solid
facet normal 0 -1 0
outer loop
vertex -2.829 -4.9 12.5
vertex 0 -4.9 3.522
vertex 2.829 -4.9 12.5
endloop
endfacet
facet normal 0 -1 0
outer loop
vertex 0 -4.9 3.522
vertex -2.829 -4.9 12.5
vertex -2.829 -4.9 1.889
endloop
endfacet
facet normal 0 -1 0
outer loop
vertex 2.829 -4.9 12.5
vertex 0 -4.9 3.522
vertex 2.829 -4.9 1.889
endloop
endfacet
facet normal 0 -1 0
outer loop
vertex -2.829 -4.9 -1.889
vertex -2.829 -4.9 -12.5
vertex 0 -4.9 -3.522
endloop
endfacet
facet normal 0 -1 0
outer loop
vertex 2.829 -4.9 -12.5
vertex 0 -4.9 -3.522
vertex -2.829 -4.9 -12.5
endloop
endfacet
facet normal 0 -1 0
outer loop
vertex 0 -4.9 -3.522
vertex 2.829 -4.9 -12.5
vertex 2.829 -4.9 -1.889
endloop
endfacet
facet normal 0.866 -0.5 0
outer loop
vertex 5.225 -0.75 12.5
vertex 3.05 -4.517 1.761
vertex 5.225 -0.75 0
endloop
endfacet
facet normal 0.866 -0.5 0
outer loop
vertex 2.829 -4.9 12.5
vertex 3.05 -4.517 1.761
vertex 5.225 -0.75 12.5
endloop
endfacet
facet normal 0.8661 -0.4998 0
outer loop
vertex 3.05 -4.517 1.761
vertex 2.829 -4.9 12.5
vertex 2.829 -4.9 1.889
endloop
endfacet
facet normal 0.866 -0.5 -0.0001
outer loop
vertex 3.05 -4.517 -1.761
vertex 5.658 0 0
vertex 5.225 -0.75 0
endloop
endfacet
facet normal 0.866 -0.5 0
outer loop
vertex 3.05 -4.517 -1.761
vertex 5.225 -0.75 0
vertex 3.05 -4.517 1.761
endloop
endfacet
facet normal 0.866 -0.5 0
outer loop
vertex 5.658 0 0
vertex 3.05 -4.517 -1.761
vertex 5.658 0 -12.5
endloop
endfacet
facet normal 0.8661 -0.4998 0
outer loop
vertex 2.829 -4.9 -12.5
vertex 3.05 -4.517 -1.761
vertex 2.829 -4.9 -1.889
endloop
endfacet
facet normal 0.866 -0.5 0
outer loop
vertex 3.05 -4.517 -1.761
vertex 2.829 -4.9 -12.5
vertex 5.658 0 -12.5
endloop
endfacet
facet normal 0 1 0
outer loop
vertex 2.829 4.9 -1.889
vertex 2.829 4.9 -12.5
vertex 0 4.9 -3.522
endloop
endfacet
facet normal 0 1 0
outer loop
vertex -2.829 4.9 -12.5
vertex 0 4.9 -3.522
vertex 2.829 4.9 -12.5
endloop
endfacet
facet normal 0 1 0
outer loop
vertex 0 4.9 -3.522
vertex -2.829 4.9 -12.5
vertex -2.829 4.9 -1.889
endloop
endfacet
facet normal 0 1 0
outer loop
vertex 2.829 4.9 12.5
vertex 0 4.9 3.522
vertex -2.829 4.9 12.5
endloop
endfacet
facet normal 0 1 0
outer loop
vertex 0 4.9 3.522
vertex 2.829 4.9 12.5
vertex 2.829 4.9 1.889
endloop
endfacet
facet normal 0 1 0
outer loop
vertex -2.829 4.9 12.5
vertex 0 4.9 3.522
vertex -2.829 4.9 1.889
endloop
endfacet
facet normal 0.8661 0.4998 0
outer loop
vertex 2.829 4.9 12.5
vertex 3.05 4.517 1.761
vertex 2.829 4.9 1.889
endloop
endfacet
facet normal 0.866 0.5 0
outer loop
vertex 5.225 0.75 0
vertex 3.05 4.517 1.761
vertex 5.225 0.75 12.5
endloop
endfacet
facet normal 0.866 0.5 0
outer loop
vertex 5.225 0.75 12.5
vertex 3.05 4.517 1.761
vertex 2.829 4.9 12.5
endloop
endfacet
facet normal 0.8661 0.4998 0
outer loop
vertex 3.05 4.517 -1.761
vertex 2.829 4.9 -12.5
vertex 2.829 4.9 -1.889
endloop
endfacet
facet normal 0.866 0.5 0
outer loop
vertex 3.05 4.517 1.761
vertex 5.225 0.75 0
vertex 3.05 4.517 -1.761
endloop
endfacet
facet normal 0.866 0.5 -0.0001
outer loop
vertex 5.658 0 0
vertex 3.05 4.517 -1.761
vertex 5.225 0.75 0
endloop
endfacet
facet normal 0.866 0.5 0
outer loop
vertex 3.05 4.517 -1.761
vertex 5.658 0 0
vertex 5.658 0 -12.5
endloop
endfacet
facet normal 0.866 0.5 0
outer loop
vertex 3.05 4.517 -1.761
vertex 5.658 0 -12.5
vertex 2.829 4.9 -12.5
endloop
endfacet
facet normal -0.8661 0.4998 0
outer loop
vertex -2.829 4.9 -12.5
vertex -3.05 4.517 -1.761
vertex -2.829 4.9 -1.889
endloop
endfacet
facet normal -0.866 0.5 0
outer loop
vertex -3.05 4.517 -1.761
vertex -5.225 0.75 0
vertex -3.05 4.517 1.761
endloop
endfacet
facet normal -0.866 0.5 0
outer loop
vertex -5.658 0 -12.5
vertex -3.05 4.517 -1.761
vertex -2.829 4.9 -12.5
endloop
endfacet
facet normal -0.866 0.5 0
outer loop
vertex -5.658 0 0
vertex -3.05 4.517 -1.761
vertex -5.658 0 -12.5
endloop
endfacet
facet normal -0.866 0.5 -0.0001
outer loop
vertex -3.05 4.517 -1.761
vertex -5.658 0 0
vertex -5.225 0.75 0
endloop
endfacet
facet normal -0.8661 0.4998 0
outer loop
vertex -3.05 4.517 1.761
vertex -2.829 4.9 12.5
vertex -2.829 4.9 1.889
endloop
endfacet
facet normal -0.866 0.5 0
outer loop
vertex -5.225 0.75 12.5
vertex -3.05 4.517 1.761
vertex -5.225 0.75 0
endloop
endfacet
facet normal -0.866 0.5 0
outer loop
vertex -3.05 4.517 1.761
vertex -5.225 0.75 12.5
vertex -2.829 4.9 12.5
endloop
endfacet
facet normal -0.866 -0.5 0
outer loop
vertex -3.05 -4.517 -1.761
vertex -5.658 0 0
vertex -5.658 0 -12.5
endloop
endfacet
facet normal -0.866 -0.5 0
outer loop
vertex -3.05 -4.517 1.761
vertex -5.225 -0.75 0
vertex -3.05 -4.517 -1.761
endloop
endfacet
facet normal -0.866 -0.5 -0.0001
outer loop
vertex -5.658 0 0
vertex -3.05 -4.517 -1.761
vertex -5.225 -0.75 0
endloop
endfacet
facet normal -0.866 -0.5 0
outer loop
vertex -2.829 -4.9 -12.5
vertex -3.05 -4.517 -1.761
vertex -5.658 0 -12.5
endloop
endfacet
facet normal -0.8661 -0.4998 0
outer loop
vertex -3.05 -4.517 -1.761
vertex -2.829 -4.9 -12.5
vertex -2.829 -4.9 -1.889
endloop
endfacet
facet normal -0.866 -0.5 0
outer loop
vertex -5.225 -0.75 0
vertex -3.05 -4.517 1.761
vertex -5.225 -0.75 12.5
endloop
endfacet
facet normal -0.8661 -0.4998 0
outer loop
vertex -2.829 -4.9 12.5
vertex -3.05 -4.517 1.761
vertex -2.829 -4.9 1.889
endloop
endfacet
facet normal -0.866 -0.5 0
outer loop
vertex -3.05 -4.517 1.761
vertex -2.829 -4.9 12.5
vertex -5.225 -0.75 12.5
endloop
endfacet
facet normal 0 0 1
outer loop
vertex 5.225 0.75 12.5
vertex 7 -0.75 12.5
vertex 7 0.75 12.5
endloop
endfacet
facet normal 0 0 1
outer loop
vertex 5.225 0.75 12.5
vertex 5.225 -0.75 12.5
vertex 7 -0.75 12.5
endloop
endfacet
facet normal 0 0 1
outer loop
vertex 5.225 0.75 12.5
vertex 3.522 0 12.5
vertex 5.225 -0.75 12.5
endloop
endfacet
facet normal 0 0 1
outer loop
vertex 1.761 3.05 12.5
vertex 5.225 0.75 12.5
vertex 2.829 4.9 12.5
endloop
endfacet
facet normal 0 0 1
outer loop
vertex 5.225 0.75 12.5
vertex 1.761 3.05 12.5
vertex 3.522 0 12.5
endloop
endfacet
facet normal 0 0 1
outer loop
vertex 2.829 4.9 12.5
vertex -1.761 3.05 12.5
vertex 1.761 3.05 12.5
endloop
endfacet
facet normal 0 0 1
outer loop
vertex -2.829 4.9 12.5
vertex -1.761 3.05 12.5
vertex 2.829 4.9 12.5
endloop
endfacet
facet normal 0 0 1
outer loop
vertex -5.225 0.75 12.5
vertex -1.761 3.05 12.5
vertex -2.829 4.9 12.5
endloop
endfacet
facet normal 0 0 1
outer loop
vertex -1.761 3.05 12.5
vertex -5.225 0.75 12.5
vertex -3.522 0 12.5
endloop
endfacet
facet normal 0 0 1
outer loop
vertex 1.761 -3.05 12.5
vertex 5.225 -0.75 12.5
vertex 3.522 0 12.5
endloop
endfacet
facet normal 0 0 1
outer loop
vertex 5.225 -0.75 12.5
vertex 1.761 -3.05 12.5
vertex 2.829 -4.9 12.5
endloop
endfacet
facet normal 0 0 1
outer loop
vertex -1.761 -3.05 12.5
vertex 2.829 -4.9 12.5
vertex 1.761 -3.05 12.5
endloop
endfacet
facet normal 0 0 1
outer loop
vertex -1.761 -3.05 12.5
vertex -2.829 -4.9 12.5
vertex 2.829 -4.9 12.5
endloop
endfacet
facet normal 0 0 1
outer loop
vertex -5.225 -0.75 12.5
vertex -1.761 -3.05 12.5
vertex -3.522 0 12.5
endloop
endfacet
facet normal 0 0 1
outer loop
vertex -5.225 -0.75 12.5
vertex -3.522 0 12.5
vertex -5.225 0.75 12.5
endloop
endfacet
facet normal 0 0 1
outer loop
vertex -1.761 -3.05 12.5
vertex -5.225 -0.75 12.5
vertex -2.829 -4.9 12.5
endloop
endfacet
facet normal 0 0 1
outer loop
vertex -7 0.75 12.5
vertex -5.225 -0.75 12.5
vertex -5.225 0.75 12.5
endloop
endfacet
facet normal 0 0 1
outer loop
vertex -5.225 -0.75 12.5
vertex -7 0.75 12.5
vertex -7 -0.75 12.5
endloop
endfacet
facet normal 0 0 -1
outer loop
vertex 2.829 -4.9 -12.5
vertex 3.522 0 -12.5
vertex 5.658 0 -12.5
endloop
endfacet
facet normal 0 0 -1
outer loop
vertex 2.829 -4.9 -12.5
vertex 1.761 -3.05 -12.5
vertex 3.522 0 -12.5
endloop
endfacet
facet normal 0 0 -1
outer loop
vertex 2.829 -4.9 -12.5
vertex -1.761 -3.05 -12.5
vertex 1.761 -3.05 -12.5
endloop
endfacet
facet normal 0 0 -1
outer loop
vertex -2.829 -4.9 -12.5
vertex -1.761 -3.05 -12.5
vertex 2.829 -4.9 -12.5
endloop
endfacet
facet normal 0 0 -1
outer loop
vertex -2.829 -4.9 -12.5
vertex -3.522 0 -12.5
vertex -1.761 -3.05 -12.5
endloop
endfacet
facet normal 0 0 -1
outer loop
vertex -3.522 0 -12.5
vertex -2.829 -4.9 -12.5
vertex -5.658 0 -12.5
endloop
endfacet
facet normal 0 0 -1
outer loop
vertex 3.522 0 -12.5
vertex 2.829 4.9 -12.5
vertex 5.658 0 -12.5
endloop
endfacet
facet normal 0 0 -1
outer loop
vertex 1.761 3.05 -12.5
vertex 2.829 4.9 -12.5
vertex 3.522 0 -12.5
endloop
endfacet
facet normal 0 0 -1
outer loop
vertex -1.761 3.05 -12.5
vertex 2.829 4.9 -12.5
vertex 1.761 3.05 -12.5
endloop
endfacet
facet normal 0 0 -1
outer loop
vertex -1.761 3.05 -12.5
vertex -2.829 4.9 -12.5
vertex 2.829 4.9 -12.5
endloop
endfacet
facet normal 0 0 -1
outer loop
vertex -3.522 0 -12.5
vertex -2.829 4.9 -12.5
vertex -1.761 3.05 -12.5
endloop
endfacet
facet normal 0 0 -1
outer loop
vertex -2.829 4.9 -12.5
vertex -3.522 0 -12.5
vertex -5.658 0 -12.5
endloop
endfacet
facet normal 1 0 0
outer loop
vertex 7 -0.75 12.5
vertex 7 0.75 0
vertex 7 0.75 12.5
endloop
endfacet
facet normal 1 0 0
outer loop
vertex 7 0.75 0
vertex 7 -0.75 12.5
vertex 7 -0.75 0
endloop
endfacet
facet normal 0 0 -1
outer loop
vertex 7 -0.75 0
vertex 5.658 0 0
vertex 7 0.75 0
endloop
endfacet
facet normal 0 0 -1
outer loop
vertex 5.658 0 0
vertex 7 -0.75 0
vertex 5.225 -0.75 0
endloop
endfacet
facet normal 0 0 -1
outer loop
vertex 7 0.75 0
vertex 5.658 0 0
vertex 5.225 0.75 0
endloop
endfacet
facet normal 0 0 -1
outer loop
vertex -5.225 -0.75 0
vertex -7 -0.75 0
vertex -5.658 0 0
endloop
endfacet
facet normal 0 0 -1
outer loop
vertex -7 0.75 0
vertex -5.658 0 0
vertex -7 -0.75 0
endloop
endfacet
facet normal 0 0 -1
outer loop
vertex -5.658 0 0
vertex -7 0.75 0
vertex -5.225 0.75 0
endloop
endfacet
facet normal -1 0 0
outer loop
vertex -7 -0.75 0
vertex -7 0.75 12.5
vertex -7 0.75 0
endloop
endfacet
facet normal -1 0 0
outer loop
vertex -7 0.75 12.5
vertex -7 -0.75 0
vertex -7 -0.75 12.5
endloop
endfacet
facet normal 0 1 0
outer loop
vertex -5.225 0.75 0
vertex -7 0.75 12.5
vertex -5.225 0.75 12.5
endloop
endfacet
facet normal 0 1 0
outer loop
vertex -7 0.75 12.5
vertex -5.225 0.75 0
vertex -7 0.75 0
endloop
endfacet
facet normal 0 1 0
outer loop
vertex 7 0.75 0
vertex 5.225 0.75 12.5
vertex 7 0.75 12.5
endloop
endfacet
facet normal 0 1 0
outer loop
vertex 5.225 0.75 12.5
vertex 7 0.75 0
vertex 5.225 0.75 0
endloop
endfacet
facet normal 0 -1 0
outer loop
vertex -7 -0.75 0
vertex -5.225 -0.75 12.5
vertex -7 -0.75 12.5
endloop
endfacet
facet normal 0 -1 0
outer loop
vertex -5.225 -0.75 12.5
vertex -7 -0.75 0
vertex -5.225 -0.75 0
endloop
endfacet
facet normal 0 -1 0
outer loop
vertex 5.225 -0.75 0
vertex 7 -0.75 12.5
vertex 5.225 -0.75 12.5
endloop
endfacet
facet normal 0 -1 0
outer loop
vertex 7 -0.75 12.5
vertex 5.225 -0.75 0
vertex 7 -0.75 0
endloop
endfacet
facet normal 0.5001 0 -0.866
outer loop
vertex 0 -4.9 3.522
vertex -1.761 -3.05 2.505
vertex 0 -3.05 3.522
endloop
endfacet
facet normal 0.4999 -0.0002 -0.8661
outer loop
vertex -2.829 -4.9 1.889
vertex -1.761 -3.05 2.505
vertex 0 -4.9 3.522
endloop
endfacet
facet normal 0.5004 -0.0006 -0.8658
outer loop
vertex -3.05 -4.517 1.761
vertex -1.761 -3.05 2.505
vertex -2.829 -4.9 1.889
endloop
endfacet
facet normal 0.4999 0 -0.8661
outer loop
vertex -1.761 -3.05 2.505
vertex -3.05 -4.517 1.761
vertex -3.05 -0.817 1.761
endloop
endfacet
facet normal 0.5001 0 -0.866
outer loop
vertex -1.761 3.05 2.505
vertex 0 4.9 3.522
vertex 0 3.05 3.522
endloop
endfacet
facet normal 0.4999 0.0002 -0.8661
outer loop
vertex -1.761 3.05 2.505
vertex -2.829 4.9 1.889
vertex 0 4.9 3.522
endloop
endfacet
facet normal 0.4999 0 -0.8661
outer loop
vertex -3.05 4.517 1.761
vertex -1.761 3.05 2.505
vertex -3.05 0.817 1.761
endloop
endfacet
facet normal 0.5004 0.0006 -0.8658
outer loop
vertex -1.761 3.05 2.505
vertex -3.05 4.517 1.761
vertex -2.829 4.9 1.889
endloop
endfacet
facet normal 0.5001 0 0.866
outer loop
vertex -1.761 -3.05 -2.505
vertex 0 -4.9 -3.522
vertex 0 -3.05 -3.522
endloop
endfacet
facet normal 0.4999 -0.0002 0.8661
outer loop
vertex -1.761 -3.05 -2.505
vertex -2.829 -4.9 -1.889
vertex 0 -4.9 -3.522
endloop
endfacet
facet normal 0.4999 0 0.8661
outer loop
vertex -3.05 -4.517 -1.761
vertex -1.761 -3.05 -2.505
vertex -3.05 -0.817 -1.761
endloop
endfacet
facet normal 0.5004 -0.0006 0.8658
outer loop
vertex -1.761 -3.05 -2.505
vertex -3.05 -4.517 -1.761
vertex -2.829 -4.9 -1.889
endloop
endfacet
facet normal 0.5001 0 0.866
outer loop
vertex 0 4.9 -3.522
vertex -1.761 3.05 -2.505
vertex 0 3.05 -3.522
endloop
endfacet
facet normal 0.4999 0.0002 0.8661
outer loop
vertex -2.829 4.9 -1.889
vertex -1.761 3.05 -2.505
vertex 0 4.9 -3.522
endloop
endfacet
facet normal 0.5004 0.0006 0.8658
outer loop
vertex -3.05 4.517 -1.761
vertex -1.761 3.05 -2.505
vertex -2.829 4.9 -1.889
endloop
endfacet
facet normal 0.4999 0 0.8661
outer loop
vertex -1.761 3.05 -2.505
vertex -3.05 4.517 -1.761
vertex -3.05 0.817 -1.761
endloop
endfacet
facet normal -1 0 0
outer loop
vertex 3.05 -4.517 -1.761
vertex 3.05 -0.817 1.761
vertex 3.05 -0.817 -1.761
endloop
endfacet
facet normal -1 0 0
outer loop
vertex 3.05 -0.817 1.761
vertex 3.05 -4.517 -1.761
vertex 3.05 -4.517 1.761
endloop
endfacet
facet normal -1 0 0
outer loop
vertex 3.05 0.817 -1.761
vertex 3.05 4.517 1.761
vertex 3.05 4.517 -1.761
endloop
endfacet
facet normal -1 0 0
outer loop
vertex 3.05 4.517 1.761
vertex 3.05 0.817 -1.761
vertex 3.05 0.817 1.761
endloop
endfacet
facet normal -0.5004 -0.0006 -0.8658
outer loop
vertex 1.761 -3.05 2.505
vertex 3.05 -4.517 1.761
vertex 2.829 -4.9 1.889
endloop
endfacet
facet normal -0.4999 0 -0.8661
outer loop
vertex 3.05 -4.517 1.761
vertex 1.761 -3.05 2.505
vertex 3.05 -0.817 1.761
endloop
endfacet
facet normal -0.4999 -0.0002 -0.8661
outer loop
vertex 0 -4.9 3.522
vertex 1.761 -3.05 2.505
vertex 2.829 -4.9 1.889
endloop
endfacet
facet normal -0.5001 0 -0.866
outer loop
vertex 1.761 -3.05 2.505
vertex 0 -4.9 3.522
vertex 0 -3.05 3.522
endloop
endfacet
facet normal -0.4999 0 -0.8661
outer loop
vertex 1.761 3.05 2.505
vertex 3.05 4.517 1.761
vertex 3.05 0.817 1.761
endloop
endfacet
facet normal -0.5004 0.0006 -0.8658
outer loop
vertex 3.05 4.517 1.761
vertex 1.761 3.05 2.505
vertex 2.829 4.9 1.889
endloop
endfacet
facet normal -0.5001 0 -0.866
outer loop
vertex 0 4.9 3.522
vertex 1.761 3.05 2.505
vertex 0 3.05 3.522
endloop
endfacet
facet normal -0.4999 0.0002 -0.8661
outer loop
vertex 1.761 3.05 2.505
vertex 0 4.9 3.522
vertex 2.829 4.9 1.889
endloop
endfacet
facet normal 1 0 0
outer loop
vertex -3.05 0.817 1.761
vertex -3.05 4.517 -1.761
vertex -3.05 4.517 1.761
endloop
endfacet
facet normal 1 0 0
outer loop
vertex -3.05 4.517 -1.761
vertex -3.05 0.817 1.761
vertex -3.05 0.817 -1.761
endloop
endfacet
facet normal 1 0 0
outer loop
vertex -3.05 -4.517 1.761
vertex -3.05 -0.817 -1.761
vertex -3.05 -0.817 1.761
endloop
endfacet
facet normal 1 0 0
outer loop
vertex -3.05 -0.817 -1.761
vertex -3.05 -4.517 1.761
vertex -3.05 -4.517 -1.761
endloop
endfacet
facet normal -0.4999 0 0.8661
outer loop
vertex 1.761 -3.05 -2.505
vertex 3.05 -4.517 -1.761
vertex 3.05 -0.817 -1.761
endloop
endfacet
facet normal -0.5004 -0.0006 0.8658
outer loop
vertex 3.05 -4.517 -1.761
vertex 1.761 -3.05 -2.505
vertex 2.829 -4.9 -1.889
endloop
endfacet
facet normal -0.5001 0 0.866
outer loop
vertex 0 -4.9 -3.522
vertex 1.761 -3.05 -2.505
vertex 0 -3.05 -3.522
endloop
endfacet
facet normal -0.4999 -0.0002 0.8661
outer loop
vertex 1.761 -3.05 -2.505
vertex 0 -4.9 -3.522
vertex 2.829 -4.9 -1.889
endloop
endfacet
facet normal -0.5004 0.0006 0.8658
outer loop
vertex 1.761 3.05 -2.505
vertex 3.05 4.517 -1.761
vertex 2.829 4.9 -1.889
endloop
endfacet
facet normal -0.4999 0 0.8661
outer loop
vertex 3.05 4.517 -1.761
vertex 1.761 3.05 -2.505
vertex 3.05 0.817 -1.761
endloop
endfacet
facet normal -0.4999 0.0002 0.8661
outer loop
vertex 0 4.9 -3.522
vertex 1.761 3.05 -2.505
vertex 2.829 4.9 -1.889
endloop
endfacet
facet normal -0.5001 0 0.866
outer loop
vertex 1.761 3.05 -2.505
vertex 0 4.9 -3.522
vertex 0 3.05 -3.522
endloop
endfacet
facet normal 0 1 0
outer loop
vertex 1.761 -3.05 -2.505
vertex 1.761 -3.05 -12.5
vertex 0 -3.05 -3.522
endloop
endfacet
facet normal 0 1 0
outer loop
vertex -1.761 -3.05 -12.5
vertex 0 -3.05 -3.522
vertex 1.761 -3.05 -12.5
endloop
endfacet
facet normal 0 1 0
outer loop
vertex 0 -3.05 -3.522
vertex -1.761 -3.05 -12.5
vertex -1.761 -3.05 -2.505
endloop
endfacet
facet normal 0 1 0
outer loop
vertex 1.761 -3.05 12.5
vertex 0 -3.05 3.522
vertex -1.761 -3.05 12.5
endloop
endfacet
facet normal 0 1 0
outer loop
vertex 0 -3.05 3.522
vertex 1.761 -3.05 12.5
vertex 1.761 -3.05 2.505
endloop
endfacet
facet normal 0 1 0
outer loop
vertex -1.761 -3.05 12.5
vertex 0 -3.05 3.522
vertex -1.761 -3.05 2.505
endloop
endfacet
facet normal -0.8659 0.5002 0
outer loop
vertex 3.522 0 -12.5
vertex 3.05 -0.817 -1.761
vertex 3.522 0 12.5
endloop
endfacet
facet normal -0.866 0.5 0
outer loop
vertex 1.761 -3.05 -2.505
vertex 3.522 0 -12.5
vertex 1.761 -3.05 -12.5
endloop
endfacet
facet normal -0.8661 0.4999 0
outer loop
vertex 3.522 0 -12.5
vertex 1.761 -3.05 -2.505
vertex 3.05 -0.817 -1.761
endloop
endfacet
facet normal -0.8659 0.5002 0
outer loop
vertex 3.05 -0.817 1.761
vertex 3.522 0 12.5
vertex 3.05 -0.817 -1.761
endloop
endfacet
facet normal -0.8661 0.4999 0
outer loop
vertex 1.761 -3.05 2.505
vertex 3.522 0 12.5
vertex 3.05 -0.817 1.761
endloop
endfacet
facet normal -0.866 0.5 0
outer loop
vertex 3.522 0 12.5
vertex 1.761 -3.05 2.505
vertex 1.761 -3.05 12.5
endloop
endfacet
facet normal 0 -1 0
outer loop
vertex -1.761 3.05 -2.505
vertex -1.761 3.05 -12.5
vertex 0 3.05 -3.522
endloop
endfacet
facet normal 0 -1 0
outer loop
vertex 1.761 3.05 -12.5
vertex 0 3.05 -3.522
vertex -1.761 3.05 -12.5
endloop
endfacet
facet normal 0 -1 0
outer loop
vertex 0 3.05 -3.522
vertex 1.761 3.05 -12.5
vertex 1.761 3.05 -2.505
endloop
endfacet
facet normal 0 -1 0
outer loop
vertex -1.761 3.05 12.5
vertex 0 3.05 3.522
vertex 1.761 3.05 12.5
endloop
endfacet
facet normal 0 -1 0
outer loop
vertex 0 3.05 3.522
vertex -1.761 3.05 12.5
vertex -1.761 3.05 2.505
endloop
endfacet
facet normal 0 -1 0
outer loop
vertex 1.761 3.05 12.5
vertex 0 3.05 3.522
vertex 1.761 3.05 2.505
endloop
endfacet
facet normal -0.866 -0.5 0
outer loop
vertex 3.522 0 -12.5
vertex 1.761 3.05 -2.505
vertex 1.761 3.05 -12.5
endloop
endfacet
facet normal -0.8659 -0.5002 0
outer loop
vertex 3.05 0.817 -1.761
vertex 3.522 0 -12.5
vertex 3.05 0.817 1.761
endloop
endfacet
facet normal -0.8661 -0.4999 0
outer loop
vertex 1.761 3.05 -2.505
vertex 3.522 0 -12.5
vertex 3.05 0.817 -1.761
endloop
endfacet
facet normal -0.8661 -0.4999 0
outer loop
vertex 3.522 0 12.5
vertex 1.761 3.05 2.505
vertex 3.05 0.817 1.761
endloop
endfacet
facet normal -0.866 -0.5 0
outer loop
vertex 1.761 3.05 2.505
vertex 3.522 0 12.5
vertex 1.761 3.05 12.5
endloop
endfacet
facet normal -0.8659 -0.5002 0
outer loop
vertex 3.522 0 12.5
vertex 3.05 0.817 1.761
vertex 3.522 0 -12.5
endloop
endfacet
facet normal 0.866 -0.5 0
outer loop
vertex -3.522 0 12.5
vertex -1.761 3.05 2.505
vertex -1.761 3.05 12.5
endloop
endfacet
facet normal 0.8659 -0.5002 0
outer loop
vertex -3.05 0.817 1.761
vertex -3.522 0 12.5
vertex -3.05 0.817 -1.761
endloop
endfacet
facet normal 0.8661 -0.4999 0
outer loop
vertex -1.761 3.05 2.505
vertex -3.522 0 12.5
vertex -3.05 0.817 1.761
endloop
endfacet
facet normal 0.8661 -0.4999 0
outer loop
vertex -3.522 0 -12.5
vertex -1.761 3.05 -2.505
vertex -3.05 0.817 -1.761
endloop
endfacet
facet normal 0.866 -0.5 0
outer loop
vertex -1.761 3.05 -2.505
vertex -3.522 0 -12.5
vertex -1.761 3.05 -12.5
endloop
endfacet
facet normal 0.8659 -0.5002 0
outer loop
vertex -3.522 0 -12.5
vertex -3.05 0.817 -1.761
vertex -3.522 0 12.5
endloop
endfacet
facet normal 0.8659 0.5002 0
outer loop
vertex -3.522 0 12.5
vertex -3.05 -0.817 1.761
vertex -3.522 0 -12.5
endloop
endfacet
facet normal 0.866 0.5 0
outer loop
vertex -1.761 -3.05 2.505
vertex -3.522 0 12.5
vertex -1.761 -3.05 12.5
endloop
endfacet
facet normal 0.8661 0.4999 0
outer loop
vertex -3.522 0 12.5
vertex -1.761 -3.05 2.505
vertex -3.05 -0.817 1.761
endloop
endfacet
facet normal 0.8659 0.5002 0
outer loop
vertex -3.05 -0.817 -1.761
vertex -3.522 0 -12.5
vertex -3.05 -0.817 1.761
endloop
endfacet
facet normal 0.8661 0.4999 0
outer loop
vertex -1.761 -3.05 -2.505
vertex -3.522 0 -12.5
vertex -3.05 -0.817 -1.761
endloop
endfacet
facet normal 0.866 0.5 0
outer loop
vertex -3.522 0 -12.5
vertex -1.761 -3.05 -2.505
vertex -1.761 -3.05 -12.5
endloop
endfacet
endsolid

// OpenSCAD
inner_to_outer_ratio = (sqrt(3)/2);
difference() {
    union(){
        cylinder(d=9.8/inner_to_outer_ratio, h=25, center=true, $fn=6);
        translate([0,0,6.25]) cube([14,1.5,12.5], center=true);
    }
    
    hex_minor = 6.1;
    rotate([90,30,0])
        cylinder(h=20,d=hex_minor/inner_to_outer_ratio, center=true, $fn=6);
    cylinder(h=26,d=hex_minor/inner_to_outer_ratio, center=true, $fn=6);
}
